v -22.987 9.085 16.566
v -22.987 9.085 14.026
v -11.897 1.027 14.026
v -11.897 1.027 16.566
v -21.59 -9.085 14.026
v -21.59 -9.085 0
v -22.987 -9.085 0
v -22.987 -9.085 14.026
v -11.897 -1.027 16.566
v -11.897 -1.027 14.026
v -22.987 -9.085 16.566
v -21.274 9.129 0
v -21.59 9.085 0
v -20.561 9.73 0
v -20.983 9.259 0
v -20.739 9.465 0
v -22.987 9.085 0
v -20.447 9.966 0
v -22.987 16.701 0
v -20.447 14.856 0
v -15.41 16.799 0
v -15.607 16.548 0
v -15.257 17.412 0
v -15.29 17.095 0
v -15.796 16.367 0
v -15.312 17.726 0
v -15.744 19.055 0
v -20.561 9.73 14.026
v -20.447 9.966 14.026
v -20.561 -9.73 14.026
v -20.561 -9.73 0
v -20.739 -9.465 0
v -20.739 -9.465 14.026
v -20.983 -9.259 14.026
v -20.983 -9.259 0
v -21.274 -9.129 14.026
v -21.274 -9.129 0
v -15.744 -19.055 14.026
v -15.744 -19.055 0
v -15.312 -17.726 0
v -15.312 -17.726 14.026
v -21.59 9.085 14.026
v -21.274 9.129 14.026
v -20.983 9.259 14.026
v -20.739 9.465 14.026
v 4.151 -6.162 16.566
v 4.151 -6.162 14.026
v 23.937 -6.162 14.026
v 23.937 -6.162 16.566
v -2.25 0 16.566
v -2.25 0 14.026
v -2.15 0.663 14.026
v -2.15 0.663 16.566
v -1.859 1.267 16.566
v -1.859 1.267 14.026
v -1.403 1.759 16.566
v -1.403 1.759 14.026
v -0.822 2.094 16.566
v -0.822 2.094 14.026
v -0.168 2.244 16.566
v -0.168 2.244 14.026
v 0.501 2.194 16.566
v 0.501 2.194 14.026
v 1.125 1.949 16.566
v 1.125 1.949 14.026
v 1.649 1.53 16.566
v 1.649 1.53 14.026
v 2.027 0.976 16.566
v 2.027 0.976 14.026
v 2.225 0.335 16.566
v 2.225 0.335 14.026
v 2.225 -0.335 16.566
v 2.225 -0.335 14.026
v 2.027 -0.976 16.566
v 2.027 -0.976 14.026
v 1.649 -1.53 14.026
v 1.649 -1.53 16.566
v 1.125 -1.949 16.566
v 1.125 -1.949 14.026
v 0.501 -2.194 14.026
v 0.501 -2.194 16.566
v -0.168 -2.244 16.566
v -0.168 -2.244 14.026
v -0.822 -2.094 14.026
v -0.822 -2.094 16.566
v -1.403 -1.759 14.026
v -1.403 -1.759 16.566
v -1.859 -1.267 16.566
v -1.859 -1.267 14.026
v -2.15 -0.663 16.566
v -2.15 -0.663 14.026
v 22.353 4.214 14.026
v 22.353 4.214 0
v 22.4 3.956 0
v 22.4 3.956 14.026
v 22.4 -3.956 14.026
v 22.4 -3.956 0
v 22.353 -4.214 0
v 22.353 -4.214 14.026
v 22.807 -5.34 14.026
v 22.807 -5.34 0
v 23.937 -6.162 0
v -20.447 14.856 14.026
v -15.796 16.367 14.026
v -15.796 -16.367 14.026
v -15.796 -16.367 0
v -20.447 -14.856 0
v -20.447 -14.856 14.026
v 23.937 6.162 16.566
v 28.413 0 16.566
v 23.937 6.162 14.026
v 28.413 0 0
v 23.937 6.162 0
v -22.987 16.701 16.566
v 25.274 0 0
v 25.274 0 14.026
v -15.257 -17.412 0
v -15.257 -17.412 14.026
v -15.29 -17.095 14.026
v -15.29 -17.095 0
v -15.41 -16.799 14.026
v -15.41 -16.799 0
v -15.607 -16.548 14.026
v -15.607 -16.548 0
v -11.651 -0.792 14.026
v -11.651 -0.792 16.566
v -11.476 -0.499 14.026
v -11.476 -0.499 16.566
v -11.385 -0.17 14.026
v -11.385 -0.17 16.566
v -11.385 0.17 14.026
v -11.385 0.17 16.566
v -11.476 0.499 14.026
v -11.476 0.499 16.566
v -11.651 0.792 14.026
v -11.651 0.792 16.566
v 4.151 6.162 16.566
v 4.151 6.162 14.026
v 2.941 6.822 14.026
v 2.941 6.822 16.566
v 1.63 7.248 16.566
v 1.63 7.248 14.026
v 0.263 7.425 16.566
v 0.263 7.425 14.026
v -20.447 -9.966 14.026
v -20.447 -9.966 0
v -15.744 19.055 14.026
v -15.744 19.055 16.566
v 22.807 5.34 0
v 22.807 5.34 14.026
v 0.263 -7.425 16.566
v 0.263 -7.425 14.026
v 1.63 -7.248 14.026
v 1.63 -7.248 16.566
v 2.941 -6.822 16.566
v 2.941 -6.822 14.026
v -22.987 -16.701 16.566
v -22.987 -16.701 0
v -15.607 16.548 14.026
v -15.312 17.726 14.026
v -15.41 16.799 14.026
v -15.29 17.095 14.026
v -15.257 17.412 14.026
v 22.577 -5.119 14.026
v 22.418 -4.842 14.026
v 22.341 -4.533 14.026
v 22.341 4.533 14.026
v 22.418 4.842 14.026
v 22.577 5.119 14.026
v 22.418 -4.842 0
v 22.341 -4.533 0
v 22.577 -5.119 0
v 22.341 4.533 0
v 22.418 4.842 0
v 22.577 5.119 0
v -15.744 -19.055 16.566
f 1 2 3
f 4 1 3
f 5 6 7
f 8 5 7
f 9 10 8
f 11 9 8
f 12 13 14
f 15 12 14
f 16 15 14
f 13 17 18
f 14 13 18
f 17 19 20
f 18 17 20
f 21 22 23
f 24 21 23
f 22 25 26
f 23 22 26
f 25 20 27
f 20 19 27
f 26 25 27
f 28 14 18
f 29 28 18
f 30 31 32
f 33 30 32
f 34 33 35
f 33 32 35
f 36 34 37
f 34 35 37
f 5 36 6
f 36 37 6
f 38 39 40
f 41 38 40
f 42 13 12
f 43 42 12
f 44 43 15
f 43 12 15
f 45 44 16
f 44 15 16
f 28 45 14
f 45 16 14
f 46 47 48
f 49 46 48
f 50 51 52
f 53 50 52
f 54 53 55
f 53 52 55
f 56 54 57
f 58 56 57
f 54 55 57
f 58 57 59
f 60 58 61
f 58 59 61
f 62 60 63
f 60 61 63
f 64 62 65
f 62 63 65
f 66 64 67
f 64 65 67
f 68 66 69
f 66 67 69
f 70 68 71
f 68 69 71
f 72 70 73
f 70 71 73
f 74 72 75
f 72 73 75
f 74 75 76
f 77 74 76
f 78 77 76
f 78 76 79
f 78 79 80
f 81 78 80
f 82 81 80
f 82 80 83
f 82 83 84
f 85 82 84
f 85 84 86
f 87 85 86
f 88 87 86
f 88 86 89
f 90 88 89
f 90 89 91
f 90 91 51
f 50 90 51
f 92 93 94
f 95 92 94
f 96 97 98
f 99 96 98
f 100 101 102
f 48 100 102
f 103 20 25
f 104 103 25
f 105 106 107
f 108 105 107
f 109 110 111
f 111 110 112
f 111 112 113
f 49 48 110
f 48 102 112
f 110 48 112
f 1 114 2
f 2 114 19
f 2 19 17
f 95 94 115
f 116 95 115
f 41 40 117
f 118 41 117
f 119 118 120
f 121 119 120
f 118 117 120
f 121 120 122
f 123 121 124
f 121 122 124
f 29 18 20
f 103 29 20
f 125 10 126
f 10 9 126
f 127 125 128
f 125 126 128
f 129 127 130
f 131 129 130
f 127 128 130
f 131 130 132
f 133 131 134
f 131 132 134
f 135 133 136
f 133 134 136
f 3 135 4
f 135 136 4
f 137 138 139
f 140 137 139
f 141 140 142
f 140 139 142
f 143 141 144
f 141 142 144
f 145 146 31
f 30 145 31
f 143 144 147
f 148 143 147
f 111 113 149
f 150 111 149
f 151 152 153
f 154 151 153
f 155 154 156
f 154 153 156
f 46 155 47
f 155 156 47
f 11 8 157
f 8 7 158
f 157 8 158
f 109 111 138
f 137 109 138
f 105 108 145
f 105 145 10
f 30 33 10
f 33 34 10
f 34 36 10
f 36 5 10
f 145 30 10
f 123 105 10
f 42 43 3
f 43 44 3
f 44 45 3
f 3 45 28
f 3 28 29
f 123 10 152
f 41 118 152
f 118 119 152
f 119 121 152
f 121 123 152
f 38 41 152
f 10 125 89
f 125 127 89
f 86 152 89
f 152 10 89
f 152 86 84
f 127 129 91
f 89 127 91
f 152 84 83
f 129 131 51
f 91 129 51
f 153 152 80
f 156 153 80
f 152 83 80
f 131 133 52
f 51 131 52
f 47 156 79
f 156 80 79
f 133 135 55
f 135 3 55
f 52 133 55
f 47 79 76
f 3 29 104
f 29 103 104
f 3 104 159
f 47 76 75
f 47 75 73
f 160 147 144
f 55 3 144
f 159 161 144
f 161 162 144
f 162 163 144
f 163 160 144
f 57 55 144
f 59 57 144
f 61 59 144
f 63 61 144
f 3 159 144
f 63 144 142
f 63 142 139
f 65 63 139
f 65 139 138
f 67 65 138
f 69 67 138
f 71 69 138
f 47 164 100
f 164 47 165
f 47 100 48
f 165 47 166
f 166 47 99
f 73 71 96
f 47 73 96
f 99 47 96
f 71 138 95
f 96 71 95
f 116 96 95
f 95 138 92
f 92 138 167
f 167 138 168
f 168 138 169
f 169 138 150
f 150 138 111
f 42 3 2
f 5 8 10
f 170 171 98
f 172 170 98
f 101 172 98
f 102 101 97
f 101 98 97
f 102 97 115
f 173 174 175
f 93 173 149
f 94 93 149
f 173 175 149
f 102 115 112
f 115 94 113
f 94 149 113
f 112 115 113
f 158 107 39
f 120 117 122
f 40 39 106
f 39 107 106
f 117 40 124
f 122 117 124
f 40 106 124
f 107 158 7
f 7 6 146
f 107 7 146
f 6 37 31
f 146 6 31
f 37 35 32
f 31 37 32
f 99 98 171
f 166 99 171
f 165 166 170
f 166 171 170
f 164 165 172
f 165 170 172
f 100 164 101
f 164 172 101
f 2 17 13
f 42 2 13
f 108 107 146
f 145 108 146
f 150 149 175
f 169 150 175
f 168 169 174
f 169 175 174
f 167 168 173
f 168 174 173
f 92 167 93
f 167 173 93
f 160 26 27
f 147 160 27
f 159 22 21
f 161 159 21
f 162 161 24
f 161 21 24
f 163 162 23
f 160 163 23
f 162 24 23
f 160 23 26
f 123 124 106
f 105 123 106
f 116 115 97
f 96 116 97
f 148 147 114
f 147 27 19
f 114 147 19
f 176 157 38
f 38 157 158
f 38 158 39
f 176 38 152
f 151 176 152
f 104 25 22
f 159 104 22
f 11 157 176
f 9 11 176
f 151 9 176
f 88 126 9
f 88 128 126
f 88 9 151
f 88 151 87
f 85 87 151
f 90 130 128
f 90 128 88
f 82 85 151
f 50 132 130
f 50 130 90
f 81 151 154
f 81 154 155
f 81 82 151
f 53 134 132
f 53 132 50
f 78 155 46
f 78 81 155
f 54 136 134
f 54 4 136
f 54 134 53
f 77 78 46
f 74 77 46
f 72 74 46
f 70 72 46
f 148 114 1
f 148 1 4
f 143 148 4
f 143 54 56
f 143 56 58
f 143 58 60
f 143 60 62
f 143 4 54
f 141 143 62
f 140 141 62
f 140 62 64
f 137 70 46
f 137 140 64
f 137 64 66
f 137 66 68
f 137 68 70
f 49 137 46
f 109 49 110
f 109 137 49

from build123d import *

# Parameters (mm, degrees)
BOSS_EXTRUDE1_DEPTH  = 14.025885253
BOSS_EXTRUDE2_DEPTH  = 2.54
CIRPATTERN1_START    = 14.025885253
CIRPATTERN1_DEPTH    = 2.54
CIRPATTERN1_2_DEPTH  = 14.025885253
FILLET1_R            = 1.27
M4_CLEARANCE_HOLE1_D = 4.5


# Read off the part's stored shape, not the designer's step: CirPattern1
with BuildPart() as part:
    # Sketch1 → Boss-Extrude1 (new body)
    with BuildSketch(Plane.XY):
        with BuildLine():
            Line((-22.987, 16.701033091), (-22.987, 9.084847245))
            Line((-22.987, 9.084847245), (-21.59, 9.084847245))
            ThreePointArc((-21.59, 9.084847245), (-20.982965782, 9.25936469), (-20.5613, 9.729625096))
            Line((-20.5613, 9.729625096), (-20.447, 9.965625061))
            Line((-20.447, 9.965625061), (-20.447, 14.85561507))
            Line((-20.447, 14.85561507), (-15.796343137, 16.366705085))
            Line((-15.796343137, 16.366705085), (-15.607214475, 16.548338845))
            ThreePointArc((-15.607214475, 16.548338845), (-15.290272145, 17.094685292), (-15.31188008, 17.725937997))
            Line((-15.31188008, 17.725937997), (-15.743576822, 19.05456395))
            Line((-15.743576822, 19.05456395), (-22.987, 16.701033091))
        make_face()
    extrude(amount=BOSS_EXTRUDE1_DEPTH)

    # Sketch2 → Boss-Extrude2 (add)
    with BuildSketch(Plane.XY.offset(14.025885253)):
        with BuildLine():
            Line((-22.987, 9.084847245), (-6.980044584, -2.544886608))
            ThreePointArc((-6.980044584, -2.544886608), (6.01059176, -4.366950532), (0.263378594, 7.424830097))
            Line((0.263378594, 7.424830097), (-15.743576822, 19.05456395))
            Line((-15.743576822, 19.05456395), (-22.987, 16.701033091))
            Line((-22.987, 16.701033091), (-22.987, 9.084847245))
        make_face()
    extrude(amount=BOSS_EXTRUDE2_DEPTH)

    # CirPattern1 outline → CirPattern1 (add)
    with BuildSketch(Plane.XY.offset(CIRPATTERN1_START)):
        with BuildLine():
            Line((-10.482780502, 0), (-22.987, -9.084847245))
            Line((-22.987, -9.084847245), (-22.987, -16.701033091))
            Line((-22.987, -16.701033091), (-15.743576822, -19.05456395))
            Line((-15.743576822, -19.05456395), (0.263378594, -7.424830097))
            ThreePointArc((0.263378594, -7.424830097), (-4.151127873, -6.161623782), (-6.980044584, -2.544886608))
            Line((-6.980044584, -2.544886608), (-10.482780502, 0))
        make_face()
        with BuildLine():
            ThreePointArc((4.151127873, 6.161623782), (7.4295, 0), (4.151127873, -6.161623782))
            Line((4.151127873, -6.161623782), (23.93681288, -6.161623782))
            Line((23.93681288, -6.161623782), (28.413494599, 0))
            Line((28.413494599, 0), (23.93681288, 6.161623782))
            Line((23.93681288, 6.161623782), (4.151127873, 6.161623782))
        make_face()
    extrude(amount=CIRPATTERN1_DEPTH)

    # CirPattern1 2 outline → CirPattern1 2 (add)
    with BuildSketch(Plane.XY):
        with BuildLine():
            Line((-20.447, -14.85561507), (-20.447, -9.965625061))
            Line((-20.447, -9.965625061), (-20.5613, -9.729625096))
            ThreePointArc((-20.5613, -9.729625096), (-20.982965782, -9.25936469), (-21.59, -9.084847245))
            Line((-21.59, -9.084847245), (-22.987, -9.084847245))
            Line((-22.987, -9.084847245), (-22.987, -16.701033091))
            Line((-22.987, -16.701033091), (-15.743576822, -19.05456395))
            Line((-15.743576822, -19.05456395), (-15.31188008, -17.725937997))
            ThreePointArc((-15.31188008, -17.725937997), (-15.290272145, -17.094685292), (-15.607214475, -16.548338845))
            Line((-15.607214475, -16.548338845), (-15.796343137, -16.366705085))
            Line((-15.796343137, -16.366705085), (-20.447, -14.85561507))
        make_face()
        with BuildLine():
            Line((22.806616138, -5.340487785), (23.93681288, -6.161623782))
            Line((23.93681288, -6.161623782), (28.413494599, 0))
            Line((28.413494599, 0), (23.93681288, 6.161623782))
            Line((23.93681288, 6.161623782), (22.806616138, 5.340487785))
            ThreePointArc((22.806616138, 5.340487785), (22.418093921, 4.842494444), (22.353371268, 4.214196857))
            Line((22.353371268, 4.214196857), (22.399617925, 3.95608502))
            Line((22.399617925, 3.95608502), (25.273881936, 0))
            Line((25.273881936, 0), (22.399617925, -3.95608502))
            Line((22.399617925, -3.95608502), (22.353371268, -4.214196857))
            ThreePointArc((22.353371268, -4.214196857), (22.418093921, -4.842494444), (22.806616138, -5.340487785))
        make_face()
    extrude(amount=CIRPATTERN1_2_DEPTH)

    # Fillet1
    fillet1_edges = [part.edges().sort_by_distance(p)[0] for p in [
        (-10.482780502, 0, 15.295885253),
    ]]
    fillet(fillet1_edges, radius=FILLET1_R)

    # M4 Clearance Hole1 (through all)
    with Locations(Plane.XY.offset(16.565885253)):
        with Locations((0, 0)):
            Hole(M4_CLEARANCE_HOLE1_D / 2)


solid = part.part
